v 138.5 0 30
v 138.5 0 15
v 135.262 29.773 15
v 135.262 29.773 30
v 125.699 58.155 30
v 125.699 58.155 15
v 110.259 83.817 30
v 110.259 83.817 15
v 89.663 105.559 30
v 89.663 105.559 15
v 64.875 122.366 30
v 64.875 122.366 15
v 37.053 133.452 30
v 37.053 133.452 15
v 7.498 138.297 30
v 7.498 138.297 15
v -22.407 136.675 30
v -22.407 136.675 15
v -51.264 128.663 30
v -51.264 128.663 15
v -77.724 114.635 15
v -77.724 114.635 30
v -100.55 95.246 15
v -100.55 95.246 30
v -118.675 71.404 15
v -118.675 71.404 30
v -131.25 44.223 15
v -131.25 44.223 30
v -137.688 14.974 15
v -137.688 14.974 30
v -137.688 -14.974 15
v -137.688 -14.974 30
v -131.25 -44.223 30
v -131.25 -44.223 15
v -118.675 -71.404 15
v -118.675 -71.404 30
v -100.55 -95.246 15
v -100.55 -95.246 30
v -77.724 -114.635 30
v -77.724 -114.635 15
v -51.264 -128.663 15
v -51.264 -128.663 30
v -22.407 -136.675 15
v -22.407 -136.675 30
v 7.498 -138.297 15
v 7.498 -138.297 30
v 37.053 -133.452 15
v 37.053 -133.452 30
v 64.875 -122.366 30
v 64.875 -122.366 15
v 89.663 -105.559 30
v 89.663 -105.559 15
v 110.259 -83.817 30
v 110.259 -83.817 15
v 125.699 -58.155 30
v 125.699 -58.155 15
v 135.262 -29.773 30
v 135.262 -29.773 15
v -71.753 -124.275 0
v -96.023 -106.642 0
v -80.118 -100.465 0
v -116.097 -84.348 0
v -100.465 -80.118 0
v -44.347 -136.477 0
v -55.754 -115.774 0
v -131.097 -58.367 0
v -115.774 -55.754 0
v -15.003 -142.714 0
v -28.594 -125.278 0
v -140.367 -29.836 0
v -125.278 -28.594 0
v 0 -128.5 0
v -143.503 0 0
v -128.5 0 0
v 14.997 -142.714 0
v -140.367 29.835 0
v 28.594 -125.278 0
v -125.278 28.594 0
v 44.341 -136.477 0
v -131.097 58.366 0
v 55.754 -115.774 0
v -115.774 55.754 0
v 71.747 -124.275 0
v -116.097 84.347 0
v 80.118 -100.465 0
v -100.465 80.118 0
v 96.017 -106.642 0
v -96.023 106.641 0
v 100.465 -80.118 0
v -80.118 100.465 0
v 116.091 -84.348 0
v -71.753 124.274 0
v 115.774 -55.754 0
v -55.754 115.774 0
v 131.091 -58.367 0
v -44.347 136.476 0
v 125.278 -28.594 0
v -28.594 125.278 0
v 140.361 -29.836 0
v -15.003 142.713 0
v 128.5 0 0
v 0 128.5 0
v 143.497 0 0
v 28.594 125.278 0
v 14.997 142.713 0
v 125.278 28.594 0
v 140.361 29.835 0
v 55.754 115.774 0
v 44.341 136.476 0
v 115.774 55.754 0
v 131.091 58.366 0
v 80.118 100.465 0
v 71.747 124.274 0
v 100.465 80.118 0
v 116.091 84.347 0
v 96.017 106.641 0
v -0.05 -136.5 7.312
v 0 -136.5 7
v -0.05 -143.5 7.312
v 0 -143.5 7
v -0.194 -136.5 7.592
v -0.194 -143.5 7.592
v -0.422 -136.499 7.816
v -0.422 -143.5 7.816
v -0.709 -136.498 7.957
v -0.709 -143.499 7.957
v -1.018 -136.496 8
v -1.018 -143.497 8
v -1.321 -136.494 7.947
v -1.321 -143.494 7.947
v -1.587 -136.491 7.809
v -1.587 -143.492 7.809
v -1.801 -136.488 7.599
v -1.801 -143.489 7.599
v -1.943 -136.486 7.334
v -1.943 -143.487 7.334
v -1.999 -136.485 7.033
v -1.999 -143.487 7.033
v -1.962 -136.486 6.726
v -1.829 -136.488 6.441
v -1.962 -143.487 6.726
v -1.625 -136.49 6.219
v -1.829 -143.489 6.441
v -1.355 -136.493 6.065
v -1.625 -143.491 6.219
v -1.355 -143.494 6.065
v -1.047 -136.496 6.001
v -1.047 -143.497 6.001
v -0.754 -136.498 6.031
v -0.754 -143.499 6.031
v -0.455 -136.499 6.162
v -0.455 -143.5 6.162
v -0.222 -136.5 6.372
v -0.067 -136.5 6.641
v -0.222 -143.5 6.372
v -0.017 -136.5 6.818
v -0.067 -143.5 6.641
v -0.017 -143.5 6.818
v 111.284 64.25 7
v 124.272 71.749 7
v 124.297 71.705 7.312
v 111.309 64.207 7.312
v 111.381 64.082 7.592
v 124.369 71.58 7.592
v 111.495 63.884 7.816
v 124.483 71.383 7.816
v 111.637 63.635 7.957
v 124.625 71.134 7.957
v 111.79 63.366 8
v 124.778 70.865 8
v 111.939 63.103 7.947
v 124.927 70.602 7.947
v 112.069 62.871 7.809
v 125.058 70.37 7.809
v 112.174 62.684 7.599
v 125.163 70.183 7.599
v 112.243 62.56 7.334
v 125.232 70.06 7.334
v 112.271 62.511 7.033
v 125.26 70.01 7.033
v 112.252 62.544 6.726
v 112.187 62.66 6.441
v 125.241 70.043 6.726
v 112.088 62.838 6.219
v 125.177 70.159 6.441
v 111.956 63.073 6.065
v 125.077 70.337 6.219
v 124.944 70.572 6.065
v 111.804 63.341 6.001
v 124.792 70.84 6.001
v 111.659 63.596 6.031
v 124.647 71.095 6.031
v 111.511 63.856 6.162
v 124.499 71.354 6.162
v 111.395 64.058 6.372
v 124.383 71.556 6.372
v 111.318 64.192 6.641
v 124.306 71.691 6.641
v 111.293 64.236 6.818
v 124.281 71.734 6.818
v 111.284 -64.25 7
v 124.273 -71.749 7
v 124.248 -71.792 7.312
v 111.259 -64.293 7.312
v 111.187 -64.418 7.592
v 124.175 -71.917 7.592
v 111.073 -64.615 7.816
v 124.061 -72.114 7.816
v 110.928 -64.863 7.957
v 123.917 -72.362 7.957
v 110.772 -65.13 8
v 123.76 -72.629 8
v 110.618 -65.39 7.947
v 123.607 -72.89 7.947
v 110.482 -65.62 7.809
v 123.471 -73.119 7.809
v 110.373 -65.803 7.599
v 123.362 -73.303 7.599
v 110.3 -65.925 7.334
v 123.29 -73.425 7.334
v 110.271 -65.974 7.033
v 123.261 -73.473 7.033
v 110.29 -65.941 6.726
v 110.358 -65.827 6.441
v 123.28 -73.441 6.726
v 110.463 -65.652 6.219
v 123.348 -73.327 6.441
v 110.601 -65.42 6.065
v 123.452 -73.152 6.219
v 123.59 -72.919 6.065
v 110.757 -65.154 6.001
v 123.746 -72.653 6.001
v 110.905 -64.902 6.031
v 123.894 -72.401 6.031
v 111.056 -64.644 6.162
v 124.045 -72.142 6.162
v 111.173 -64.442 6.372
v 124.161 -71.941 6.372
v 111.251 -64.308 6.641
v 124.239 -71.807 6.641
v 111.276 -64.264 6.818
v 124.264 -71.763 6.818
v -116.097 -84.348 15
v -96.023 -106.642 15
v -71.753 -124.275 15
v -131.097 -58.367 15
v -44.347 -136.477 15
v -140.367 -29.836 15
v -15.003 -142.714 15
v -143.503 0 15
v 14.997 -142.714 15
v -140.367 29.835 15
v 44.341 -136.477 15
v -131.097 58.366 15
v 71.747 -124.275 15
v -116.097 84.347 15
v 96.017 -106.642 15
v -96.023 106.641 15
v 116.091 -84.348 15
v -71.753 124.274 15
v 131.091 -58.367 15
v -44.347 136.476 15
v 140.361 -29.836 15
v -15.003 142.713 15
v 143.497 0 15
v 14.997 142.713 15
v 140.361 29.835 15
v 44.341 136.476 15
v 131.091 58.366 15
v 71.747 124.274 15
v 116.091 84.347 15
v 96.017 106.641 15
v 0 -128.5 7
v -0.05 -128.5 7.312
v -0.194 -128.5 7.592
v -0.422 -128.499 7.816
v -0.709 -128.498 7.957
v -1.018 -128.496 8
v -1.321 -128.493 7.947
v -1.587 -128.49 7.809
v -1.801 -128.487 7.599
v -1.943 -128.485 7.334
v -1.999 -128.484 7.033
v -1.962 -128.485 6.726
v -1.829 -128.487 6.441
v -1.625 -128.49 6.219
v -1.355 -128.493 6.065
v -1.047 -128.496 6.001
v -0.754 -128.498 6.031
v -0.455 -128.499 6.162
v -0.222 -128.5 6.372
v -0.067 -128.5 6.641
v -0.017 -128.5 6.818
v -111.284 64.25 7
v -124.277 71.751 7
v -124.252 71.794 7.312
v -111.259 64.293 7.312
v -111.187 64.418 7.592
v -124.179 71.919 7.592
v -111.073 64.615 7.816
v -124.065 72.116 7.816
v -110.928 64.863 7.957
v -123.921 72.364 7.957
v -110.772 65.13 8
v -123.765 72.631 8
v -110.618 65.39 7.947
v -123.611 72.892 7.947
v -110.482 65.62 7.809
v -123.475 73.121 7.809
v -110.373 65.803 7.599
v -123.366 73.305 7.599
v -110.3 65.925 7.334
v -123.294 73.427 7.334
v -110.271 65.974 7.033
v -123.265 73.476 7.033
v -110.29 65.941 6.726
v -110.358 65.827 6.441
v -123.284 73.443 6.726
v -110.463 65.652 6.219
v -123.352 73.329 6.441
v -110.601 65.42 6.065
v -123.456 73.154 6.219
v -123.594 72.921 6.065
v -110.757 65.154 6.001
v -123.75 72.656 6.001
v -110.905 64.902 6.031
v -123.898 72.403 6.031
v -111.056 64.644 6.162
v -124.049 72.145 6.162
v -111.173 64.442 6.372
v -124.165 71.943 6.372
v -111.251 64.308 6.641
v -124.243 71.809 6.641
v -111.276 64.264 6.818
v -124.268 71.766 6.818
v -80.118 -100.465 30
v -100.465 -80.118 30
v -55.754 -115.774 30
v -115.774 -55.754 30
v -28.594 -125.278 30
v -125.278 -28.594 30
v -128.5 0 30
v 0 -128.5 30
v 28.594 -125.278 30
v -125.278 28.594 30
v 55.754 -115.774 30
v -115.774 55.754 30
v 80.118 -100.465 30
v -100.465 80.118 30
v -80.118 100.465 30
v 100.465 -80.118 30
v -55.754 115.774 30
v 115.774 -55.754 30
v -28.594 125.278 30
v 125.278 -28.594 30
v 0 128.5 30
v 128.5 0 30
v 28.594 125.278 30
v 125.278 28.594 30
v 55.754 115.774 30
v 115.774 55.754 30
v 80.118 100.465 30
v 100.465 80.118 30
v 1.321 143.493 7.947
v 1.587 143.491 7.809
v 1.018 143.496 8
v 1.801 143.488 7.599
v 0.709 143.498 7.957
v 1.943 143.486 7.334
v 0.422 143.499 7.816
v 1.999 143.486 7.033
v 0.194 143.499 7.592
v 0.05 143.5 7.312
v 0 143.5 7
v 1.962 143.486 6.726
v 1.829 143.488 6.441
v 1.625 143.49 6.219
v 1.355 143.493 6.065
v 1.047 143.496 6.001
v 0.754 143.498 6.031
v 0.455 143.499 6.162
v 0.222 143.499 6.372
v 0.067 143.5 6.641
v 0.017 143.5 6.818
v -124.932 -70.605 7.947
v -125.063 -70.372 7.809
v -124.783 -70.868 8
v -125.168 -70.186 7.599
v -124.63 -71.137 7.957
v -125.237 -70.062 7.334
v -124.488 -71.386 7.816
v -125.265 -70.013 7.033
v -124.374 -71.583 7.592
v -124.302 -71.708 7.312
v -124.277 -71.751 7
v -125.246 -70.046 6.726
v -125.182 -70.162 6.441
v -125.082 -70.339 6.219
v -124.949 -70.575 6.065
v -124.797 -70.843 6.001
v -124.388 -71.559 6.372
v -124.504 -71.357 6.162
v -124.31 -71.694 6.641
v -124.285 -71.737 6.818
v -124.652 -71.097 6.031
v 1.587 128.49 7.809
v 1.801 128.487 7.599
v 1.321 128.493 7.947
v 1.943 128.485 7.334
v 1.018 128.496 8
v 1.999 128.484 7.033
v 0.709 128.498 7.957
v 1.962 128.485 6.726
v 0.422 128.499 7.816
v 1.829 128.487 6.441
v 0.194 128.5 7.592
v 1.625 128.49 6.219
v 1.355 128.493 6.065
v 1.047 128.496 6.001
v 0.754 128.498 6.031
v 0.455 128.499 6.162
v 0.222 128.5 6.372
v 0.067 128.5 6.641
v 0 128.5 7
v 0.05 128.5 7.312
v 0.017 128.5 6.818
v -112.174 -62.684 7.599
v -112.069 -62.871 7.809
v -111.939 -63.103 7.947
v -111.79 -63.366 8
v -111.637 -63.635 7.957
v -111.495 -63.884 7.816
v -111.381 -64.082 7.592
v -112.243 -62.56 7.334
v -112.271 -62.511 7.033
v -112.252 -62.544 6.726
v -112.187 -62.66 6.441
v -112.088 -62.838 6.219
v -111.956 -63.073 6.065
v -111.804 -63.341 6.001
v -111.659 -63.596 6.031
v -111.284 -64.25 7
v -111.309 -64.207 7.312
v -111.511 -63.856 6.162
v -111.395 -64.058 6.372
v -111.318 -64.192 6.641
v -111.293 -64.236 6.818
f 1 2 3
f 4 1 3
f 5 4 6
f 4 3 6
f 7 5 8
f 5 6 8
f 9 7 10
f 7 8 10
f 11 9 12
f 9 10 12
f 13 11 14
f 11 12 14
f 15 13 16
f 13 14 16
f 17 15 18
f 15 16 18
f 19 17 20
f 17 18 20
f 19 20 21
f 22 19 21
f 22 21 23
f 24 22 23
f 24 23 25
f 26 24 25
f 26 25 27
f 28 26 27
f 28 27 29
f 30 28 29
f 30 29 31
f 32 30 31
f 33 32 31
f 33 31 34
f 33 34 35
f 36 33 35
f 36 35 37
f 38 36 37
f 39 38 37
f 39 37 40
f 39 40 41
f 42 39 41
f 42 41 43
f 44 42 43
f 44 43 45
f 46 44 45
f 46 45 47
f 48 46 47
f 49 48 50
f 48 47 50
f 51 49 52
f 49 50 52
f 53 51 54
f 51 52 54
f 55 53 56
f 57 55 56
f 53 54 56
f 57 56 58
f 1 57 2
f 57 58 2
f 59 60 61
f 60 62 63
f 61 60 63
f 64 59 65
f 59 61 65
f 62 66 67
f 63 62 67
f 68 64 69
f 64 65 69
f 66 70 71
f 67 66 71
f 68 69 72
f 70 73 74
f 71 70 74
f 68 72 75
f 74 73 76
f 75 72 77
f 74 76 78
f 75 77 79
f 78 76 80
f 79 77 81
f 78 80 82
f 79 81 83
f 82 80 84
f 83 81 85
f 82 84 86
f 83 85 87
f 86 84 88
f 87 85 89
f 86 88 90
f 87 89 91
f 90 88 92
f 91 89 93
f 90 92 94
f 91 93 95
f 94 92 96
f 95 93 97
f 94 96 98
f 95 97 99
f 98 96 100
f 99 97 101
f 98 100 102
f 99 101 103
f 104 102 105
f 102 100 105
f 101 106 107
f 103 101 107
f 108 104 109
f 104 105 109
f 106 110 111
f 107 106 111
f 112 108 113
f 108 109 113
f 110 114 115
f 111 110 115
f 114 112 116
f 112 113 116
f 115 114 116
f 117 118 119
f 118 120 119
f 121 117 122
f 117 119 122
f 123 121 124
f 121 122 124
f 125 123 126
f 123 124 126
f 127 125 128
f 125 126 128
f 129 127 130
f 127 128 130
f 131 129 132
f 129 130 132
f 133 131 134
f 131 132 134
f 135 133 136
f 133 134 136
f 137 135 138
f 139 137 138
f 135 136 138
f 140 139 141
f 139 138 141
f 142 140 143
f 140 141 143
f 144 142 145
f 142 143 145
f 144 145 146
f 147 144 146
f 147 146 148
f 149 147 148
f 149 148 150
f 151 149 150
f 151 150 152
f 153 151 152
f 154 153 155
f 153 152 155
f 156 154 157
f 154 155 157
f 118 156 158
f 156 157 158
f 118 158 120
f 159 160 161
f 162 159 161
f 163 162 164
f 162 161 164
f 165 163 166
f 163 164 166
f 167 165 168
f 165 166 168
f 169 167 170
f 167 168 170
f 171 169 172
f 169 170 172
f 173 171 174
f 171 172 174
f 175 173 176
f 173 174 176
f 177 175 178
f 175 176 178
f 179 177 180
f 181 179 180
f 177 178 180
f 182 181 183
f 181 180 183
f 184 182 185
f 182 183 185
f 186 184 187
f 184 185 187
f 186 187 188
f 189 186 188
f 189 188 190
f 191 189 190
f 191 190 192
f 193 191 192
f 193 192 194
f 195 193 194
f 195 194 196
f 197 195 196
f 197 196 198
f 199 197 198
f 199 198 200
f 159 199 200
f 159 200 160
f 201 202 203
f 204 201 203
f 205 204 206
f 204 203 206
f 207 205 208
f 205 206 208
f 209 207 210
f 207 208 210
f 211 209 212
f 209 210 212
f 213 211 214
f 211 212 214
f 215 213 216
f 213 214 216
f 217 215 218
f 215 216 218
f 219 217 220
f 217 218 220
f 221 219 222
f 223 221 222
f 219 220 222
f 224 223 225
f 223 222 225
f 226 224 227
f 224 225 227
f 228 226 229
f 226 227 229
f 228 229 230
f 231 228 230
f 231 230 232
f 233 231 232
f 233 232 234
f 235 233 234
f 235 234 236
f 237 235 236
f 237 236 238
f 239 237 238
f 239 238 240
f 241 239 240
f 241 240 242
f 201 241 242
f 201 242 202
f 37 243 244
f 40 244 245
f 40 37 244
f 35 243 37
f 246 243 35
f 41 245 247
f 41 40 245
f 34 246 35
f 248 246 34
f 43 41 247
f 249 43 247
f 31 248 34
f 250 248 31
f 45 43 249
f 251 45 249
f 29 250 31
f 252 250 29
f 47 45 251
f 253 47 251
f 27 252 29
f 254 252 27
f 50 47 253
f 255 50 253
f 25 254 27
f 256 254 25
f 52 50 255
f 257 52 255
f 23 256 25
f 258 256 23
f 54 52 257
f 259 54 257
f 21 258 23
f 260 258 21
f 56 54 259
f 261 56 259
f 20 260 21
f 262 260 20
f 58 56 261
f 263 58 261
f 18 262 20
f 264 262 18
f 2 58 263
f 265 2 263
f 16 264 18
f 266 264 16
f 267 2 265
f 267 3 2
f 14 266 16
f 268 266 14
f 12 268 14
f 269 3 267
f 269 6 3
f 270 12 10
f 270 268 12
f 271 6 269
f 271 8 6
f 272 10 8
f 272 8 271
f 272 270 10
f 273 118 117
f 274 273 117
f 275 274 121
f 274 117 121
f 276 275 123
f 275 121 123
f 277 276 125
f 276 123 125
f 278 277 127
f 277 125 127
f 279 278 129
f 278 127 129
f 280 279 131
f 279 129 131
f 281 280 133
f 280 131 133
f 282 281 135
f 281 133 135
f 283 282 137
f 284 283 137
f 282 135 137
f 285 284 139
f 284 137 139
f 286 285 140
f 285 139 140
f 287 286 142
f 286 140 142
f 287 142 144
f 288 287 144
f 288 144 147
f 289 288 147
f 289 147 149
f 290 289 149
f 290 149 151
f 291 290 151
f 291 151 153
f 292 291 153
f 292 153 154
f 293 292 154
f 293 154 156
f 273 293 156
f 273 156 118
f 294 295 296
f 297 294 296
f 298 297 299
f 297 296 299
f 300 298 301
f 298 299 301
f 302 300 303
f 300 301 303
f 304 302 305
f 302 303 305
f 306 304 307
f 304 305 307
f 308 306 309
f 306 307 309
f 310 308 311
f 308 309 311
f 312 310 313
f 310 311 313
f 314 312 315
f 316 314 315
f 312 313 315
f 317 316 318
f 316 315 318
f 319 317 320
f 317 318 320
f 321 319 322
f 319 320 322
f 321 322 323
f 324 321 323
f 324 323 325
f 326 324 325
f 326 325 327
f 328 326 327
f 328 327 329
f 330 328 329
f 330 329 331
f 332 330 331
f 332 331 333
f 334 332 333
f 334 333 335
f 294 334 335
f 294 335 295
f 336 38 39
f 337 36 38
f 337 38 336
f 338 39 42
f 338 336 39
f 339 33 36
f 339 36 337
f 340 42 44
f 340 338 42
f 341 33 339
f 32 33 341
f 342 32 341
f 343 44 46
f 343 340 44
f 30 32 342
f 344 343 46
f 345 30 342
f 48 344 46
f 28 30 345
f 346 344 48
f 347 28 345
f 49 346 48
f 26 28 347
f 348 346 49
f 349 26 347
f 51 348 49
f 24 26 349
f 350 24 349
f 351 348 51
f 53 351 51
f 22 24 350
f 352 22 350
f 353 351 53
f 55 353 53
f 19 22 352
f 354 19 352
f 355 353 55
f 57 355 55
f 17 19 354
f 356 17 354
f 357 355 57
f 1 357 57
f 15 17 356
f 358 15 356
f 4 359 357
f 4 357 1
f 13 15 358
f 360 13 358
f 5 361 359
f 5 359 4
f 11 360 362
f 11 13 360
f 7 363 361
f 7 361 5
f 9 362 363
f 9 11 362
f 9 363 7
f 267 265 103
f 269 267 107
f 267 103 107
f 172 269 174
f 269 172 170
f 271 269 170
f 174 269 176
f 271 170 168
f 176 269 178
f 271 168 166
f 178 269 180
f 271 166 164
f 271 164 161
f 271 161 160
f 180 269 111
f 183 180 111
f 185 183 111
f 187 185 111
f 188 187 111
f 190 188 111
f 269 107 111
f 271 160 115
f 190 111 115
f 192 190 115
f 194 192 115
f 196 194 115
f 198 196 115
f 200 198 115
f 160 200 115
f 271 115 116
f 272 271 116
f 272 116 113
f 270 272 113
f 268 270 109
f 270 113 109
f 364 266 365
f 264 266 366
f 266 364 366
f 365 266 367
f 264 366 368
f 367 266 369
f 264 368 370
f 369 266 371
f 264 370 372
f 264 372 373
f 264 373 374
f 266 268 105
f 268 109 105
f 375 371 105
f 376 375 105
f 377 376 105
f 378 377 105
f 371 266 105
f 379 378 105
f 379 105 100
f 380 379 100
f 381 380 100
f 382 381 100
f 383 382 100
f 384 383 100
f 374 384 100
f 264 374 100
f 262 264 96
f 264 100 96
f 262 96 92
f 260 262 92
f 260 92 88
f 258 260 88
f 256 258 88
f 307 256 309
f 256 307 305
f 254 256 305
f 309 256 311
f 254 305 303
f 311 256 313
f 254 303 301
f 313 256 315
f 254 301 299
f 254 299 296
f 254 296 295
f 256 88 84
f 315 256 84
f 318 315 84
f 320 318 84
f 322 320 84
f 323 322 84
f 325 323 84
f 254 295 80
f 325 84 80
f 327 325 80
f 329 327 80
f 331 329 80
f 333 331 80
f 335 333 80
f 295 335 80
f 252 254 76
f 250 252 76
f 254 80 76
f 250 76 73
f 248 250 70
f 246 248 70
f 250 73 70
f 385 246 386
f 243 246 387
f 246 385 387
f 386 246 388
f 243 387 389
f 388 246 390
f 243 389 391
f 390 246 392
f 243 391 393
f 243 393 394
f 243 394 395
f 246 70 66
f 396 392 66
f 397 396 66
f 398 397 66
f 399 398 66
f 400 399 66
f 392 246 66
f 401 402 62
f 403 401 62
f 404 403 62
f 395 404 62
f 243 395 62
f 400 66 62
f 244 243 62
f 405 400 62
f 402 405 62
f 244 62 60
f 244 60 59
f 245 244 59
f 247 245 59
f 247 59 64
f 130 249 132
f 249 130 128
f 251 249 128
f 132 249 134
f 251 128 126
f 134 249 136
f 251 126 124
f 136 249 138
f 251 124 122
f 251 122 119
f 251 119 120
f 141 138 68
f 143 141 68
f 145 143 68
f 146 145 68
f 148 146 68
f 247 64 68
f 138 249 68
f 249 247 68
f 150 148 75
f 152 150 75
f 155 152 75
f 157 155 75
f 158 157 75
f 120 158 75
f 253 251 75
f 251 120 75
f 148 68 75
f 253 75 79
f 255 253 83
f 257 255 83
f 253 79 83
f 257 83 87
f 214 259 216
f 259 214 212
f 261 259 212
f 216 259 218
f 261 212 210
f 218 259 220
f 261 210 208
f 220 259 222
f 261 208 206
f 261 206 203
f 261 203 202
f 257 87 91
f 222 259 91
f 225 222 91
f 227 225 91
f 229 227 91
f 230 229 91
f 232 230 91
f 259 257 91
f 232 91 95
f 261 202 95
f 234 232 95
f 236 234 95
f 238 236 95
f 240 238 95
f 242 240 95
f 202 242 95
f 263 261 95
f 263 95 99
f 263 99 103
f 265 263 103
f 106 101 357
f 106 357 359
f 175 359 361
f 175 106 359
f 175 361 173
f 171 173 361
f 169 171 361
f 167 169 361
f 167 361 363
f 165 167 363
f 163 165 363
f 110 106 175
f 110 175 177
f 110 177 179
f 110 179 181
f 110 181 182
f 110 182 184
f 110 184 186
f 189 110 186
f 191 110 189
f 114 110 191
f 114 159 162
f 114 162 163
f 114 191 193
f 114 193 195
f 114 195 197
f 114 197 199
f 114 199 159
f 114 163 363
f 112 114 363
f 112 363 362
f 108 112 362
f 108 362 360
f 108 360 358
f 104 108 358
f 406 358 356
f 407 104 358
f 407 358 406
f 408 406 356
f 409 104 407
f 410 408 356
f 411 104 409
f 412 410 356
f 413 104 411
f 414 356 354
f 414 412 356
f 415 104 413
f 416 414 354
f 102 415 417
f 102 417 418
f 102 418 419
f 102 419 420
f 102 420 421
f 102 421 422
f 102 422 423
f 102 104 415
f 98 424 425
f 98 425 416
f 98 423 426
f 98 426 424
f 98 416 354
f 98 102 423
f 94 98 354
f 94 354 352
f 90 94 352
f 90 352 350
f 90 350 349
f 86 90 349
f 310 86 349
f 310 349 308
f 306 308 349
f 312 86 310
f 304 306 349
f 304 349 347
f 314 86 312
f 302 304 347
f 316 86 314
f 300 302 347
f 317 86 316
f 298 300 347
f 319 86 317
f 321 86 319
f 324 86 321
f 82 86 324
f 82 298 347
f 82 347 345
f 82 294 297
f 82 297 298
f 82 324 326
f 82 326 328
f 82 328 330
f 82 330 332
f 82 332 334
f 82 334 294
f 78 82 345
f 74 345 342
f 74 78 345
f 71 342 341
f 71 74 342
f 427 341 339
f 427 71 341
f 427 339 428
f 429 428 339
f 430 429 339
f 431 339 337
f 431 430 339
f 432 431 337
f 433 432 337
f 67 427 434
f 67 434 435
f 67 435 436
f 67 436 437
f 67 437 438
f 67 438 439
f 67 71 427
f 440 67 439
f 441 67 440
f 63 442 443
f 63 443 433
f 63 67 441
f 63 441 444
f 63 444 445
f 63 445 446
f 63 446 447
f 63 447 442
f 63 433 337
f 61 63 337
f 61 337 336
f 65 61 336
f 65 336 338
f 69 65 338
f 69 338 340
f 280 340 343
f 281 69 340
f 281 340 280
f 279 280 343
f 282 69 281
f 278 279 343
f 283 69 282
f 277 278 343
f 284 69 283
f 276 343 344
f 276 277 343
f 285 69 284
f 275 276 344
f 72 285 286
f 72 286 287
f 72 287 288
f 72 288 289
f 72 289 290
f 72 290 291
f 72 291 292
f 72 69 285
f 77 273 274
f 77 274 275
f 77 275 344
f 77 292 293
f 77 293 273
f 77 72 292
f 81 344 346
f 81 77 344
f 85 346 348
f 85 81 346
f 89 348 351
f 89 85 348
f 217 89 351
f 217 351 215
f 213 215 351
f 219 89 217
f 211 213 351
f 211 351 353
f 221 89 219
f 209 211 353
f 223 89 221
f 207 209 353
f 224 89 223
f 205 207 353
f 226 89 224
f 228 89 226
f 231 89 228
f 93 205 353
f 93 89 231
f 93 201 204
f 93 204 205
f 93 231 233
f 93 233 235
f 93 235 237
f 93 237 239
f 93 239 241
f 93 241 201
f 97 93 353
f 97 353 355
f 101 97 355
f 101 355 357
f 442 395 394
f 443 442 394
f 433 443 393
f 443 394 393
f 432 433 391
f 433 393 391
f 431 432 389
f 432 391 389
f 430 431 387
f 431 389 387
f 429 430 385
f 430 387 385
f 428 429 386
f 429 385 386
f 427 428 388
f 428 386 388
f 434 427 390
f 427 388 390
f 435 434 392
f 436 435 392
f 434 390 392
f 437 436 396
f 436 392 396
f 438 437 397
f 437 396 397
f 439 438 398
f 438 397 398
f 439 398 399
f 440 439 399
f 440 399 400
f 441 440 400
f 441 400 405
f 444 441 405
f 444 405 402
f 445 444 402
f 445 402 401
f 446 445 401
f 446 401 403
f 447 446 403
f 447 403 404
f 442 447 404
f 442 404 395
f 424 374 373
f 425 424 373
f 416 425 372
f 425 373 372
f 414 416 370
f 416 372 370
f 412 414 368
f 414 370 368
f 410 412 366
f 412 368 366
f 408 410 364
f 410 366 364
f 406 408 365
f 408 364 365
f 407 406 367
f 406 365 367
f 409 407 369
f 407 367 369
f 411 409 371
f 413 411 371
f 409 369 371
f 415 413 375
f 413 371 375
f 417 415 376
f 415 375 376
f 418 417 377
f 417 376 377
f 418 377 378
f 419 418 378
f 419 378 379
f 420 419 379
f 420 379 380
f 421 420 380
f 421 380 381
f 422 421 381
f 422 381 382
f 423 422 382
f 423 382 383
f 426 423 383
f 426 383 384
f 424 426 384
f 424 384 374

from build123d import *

# Parameters (mm, degrees)
SKETCH_R              = 138.5
SKETCH_R_2            = 128.5
PAD_DEPTH             = 30
SKETCH002_R           = 1
POCKET001_DEPTH       = 28
SKETCH003_R           = 143.5
SKETCH003_R_2         = 136.5
PAD001_DEPTH          = 15
POCKET002_DEPTH       = 30
POLARPATTERN002_COUNT = 6


with BuildPart() as part:
    # Sketch → Pad (new body)
    with BuildSketch(Plane.XY):
        Circle(SKETCH_R)
        Circle(SKETCH_R_2, mode=Mode.SUBTRACT)
    extrude(amount=PAD_DEPTH)

    # Sketch002 (on DatumPlane) → Pocket001 (cut)
    with BuildSketch(Plane(origin=(-1, -155, 0), x_dir=(1, 0, 0), z_dir=(0, -1, 0))):
        with Locations((0, 7)):
            Circle(SKETCH002_R)
    extrude(amount=-POCKET001_DEPTH, mode=Mode.SUBTRACT)

    # Sketch003 → Pad001 (join)
    with BuildSketch(Plane.XY):
        with Locations((-0.00298, -0.000479)):
            Circle(SKETCH003_R)
        with Locations((-0.006501, 0.000101)):
            Circle(SKETCH003_R_2, mode=Mode.SUBTRACT)
    extrude(amount=PAD001_DEPTH)

    # Sketch002 (on DatumPlane) → Pocket002 (cut)
    with BuildSketch(Plane(origin=(-1, -155, 0), x_dir=(1, 0, 0), z_dir=(0, -1, 0))):
        with Locations((0, 7)):
            Circle(SKETCH002_R)
    pocket002 = extrude(amount=-POCKET002_DEPTH, mode=Mode.SUBTRACT)

    # PolarPattern002: Pocket002 ×6 about axis
    polarpattern002_axis = Axis((0, 0, 0), (0, 0, 1))
    for i in range(1, POLARPATTERN002_COUNT):
        add(pocket002.rotate(polarpattern002_axis, i * 360 / POLARPATTERN002_COUNT), mode=Mode.SUBTRACT)


solid = part.part
